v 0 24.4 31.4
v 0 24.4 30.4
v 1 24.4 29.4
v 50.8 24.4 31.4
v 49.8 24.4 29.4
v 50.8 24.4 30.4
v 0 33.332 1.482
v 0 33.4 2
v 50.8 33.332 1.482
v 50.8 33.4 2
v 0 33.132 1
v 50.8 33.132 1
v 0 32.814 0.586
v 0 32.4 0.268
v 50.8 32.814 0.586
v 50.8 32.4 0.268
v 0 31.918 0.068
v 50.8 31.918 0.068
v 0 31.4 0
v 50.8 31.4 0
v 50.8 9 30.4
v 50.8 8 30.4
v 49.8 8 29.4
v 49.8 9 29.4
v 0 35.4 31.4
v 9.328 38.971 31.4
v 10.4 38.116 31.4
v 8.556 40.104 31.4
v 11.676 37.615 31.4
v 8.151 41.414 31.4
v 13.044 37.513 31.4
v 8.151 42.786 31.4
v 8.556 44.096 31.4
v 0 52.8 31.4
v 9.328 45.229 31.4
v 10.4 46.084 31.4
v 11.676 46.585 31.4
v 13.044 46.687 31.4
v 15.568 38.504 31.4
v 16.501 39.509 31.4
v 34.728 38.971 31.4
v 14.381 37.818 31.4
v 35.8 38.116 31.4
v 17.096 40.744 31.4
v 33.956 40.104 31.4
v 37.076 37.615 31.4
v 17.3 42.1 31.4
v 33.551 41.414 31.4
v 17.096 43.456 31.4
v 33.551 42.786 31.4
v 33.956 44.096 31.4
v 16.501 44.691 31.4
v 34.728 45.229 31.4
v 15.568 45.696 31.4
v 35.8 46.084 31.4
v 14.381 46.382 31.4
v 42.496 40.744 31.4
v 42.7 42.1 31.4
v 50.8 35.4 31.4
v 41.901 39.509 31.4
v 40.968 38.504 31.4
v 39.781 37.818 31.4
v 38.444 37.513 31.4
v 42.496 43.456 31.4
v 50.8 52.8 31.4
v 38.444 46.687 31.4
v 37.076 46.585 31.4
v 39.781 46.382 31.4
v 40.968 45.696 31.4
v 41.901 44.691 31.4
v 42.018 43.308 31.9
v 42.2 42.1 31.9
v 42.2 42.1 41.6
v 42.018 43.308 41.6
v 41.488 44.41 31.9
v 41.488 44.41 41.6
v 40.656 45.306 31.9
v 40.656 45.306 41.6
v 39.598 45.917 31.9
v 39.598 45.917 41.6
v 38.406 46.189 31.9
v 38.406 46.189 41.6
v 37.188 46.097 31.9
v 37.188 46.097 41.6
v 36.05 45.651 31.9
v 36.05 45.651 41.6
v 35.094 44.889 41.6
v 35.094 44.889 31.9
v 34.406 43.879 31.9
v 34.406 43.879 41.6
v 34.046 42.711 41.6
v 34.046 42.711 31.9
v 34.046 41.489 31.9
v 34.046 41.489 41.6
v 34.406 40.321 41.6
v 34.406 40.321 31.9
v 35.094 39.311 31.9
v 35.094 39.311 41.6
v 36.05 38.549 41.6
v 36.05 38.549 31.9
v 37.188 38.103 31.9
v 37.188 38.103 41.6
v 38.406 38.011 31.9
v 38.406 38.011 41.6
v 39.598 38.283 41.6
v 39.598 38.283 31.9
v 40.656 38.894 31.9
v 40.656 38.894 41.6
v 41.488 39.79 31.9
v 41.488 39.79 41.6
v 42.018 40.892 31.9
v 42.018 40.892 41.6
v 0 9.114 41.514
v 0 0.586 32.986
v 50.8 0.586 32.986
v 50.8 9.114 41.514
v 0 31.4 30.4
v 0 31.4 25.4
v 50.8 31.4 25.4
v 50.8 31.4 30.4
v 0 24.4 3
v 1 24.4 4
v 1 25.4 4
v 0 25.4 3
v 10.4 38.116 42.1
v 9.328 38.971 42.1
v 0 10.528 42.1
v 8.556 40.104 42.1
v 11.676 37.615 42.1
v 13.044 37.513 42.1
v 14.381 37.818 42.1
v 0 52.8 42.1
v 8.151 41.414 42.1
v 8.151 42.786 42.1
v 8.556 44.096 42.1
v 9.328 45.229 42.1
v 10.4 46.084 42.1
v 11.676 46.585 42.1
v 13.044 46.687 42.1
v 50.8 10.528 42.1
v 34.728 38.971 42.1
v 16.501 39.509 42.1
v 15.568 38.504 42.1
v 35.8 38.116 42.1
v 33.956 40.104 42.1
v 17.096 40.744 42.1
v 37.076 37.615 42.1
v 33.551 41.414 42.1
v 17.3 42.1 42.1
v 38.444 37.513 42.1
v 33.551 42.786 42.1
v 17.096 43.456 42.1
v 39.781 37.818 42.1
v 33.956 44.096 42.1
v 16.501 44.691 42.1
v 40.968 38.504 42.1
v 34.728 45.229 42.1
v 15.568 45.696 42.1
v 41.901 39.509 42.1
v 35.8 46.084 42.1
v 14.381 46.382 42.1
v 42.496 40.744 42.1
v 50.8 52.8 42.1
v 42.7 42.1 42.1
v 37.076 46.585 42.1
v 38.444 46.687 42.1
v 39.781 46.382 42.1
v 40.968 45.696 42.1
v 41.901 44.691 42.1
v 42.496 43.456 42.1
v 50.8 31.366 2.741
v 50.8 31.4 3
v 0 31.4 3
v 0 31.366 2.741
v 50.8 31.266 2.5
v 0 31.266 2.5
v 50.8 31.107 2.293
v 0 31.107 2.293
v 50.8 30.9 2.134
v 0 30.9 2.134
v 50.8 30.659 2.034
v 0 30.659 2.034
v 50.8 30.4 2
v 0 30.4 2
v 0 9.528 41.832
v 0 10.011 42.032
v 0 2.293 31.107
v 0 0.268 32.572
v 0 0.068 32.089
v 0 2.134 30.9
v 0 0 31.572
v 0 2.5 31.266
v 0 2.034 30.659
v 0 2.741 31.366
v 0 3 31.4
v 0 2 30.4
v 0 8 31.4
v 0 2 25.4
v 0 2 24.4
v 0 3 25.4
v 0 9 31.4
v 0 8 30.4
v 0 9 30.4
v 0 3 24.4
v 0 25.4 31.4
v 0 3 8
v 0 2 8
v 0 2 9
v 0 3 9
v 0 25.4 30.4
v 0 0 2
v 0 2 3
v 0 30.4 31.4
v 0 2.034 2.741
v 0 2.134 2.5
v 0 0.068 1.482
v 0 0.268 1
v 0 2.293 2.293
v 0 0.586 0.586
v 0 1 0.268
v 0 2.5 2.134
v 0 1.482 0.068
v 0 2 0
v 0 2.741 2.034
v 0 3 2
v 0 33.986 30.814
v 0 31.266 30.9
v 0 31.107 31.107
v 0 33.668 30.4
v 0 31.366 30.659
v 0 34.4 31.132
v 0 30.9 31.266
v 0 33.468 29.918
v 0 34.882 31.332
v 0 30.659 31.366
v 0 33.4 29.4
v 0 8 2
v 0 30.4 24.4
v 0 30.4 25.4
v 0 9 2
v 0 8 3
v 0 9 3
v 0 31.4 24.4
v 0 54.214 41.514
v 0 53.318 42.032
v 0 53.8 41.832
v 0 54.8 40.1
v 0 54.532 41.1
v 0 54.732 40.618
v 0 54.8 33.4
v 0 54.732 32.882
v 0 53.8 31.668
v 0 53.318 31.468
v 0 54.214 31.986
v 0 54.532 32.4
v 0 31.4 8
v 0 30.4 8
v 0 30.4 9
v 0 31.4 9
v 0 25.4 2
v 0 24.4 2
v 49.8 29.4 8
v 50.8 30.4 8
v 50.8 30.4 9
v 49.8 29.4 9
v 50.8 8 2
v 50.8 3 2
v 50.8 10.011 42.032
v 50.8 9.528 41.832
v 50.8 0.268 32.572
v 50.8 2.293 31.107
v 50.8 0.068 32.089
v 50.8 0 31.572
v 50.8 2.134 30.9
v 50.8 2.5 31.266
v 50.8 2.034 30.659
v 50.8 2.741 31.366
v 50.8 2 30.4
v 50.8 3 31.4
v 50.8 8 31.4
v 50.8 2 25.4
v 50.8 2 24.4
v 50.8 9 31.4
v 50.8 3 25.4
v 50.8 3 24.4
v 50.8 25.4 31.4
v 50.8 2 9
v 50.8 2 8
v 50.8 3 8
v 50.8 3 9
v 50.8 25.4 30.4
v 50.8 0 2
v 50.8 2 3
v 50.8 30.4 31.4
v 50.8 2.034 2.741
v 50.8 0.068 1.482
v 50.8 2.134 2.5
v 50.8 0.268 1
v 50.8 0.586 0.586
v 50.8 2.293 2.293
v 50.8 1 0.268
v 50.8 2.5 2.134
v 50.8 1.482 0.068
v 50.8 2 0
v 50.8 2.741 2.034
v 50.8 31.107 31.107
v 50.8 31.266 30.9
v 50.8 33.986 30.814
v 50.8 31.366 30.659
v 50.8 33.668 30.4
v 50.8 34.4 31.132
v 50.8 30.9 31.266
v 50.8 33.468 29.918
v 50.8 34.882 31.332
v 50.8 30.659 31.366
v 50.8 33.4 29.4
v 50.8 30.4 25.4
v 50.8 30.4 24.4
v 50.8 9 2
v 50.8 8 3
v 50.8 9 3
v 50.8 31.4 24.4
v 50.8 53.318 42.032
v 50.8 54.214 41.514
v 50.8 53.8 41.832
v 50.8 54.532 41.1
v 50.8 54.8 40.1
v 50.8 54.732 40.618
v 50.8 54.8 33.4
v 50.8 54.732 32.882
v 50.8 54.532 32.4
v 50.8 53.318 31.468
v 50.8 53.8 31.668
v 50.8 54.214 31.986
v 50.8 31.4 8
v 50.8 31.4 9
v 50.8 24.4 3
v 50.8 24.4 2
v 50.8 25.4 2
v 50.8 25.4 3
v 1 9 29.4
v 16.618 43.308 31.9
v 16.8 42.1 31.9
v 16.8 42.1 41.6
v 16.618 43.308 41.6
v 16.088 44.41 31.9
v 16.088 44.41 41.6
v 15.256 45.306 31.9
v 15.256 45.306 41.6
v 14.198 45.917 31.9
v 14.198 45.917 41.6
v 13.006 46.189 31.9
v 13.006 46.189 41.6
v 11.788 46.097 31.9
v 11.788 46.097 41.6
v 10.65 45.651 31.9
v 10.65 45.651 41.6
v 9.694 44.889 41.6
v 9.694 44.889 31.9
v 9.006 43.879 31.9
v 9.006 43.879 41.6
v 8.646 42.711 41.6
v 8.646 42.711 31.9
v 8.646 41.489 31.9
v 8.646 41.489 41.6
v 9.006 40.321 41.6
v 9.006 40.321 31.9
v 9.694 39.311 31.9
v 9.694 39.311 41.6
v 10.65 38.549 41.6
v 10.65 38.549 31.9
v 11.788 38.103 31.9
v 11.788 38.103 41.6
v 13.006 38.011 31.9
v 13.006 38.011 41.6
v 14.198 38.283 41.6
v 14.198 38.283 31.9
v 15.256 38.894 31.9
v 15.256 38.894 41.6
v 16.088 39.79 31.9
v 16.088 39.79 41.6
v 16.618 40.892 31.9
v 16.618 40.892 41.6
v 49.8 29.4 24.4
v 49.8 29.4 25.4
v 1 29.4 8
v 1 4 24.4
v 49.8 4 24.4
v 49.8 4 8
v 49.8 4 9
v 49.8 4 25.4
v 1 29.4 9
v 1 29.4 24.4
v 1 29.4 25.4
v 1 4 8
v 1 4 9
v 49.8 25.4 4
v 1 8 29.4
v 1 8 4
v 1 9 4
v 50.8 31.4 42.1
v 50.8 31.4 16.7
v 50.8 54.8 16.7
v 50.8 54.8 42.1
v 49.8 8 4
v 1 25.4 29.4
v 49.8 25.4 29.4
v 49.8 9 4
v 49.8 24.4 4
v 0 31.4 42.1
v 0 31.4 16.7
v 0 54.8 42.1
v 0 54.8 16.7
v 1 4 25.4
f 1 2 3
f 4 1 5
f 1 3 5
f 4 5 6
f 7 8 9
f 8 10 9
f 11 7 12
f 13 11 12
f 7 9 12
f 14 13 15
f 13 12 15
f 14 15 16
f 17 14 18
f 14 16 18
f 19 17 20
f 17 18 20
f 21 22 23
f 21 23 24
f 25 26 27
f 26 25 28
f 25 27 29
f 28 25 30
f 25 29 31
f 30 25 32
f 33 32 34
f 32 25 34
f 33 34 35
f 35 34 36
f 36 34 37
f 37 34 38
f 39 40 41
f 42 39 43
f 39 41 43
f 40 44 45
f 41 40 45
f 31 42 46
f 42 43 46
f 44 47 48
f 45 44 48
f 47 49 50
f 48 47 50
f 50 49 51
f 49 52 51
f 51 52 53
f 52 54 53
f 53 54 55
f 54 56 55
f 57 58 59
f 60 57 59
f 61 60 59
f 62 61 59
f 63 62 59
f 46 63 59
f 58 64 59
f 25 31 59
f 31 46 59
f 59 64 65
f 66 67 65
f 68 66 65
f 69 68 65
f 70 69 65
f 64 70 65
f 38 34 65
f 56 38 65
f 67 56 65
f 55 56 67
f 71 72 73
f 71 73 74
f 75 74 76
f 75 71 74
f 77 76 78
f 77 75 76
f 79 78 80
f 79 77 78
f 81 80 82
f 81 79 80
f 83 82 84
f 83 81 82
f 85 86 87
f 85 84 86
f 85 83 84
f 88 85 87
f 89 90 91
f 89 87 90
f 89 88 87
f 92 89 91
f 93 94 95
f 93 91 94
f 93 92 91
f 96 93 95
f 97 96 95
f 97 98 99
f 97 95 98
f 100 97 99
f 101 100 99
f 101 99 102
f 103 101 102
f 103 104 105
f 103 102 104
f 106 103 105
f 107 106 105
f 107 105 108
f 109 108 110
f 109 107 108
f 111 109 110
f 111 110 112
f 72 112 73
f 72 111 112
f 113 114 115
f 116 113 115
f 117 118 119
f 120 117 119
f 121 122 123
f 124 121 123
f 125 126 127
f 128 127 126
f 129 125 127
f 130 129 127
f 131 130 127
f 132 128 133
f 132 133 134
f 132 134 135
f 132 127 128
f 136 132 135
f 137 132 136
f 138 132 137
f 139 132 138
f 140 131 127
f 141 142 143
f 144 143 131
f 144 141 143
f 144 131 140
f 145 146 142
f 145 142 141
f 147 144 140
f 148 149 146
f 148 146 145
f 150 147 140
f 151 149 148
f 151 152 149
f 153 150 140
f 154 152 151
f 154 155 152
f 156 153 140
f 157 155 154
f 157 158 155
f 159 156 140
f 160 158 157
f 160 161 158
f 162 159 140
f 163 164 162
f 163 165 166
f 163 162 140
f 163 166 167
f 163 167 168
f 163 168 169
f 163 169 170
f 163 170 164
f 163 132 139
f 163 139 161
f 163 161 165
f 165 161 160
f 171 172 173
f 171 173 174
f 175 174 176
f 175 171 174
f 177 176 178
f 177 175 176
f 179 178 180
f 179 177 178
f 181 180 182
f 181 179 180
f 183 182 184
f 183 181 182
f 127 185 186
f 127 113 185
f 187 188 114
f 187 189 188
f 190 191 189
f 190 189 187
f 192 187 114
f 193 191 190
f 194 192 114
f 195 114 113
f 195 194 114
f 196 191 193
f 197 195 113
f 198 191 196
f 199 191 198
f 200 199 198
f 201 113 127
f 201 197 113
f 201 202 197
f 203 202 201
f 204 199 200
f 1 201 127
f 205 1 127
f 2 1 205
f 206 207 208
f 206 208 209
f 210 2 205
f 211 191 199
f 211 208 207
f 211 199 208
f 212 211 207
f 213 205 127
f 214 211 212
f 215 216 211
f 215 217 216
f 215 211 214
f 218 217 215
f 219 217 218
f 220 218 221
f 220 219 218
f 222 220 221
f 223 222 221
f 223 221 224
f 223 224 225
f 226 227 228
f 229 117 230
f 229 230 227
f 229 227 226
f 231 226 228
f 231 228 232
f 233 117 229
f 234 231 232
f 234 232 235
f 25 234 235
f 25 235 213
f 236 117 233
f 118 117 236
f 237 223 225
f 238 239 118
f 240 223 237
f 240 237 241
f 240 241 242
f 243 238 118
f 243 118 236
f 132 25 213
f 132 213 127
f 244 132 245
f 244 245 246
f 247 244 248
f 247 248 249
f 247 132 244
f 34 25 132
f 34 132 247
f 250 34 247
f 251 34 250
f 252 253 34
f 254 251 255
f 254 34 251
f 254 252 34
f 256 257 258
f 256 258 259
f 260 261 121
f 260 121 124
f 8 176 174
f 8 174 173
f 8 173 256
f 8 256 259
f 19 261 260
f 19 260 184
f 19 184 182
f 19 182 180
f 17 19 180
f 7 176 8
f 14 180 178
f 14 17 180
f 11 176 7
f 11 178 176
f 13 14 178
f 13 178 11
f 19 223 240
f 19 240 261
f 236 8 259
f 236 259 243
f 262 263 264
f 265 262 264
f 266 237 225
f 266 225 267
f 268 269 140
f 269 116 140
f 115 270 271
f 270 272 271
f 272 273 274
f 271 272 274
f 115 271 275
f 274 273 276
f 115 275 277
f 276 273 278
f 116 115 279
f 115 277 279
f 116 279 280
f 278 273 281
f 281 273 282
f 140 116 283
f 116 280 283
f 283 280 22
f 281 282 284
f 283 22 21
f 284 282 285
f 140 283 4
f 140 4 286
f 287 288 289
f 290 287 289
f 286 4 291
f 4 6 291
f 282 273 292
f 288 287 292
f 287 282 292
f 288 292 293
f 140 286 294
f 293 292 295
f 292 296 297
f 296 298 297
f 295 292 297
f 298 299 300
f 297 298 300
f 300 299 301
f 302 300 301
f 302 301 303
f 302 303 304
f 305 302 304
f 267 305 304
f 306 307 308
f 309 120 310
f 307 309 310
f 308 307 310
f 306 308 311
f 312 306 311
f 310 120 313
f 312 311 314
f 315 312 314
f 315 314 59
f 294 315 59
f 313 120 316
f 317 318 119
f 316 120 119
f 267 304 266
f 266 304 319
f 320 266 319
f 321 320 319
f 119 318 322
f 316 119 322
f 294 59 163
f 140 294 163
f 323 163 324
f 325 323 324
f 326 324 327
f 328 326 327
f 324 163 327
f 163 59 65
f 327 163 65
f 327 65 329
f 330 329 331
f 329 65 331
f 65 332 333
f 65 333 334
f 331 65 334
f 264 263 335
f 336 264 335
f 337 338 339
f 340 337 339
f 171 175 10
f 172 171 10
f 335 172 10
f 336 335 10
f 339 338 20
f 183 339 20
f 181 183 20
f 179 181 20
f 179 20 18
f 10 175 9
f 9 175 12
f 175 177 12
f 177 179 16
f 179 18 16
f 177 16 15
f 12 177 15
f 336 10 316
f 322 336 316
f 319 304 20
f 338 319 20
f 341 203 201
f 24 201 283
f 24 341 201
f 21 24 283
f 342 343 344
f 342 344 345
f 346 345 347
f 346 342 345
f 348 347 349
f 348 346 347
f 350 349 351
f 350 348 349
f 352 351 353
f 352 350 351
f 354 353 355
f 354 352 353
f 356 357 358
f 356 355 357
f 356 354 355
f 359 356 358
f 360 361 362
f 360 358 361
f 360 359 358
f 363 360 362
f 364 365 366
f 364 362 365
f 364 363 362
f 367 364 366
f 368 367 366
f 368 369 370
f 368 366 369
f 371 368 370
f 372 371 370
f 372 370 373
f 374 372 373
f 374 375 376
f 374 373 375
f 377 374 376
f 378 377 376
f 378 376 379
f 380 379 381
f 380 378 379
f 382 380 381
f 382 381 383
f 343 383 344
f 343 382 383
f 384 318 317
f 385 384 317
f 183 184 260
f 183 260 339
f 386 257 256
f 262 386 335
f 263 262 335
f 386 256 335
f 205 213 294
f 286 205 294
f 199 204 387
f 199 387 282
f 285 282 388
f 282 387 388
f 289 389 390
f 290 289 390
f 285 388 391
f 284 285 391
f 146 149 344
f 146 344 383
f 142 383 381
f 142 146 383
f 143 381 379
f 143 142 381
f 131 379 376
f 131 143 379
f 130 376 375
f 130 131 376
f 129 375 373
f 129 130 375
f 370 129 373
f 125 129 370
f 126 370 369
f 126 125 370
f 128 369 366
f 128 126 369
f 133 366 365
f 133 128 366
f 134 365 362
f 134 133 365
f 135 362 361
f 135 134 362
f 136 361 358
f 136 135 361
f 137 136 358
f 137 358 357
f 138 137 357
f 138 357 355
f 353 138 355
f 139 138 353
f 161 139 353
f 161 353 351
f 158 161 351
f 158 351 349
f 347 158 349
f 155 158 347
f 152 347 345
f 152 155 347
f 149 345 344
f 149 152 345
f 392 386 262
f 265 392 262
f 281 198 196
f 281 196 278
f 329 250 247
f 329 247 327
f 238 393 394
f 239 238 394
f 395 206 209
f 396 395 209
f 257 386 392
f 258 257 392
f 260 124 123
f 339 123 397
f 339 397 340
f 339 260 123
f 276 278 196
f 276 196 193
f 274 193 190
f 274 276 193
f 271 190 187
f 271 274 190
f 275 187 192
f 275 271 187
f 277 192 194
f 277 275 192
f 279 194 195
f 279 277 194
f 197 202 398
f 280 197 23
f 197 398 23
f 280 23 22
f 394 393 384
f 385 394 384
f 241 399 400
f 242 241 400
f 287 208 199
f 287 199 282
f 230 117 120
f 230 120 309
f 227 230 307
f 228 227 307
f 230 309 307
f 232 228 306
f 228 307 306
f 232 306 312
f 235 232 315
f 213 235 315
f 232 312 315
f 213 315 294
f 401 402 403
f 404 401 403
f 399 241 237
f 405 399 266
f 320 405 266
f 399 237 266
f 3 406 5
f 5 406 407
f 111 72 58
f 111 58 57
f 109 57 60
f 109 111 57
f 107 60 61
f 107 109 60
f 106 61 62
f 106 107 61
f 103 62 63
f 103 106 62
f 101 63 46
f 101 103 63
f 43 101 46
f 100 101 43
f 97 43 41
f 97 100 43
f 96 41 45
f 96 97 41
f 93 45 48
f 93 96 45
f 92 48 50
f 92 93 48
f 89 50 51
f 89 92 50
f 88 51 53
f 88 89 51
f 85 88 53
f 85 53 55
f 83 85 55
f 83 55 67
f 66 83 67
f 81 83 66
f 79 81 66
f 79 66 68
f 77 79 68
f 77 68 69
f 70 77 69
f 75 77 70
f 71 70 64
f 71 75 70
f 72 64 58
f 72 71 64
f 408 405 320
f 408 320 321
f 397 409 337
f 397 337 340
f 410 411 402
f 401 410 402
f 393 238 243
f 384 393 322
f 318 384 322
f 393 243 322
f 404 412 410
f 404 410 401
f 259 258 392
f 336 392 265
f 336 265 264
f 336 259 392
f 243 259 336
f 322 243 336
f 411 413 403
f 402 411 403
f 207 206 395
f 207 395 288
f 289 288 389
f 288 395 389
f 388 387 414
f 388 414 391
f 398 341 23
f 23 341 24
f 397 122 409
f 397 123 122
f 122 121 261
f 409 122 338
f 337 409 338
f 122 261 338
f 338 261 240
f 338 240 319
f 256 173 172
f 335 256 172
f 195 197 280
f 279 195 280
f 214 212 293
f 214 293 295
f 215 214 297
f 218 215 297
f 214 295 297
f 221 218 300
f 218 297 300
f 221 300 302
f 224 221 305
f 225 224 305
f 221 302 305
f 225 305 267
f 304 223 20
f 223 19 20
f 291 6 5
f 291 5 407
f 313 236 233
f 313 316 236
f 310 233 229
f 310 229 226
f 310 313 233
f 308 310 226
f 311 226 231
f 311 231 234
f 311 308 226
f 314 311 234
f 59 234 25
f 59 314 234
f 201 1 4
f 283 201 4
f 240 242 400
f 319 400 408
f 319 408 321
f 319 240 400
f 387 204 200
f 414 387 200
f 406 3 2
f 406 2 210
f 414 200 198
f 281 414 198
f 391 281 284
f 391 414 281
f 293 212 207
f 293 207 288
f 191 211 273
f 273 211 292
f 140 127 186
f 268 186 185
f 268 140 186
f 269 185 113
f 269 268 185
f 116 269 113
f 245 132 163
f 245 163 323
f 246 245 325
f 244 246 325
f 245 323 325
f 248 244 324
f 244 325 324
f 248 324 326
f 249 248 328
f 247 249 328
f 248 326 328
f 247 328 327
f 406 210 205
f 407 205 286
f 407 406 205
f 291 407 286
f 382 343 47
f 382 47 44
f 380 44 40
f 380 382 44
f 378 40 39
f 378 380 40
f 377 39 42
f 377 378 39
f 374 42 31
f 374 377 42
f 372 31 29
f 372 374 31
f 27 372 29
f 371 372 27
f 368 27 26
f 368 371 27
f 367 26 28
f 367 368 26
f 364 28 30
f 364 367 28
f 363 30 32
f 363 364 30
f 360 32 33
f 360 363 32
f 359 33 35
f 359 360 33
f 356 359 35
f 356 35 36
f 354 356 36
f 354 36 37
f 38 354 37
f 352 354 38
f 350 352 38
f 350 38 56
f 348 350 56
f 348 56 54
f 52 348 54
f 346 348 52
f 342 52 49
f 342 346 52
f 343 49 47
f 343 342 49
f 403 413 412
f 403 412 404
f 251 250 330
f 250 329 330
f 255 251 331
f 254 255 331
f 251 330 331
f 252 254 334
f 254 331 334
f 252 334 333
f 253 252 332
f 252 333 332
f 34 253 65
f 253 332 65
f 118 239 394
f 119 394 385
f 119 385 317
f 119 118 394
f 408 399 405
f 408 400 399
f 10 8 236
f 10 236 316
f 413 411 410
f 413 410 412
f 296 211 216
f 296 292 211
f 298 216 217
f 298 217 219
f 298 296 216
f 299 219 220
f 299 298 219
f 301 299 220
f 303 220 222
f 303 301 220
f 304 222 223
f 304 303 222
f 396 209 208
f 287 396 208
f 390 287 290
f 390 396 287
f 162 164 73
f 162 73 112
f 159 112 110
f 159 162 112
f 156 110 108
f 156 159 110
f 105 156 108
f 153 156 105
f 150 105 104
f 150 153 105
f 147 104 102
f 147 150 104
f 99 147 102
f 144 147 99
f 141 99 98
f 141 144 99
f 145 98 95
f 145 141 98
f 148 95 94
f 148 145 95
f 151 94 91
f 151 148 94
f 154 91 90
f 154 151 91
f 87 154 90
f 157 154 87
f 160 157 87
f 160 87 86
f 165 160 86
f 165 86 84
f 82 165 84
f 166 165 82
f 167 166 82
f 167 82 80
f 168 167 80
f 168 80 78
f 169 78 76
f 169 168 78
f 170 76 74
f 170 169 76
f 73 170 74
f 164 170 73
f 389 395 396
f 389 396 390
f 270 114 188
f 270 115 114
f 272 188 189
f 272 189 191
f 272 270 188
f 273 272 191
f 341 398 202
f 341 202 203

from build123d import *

# Parameters (mm, degrees)
BOX011_W          = 50.8
BOX011_H          = 23.4
BOX011_DEPTH      = 25.4
BOX005_W          = 50.8
BOX005_H          = 4
BOX005_DEPTH      = 1
BOX008_W          = 50.8
BOX008_H          = 1
BOX008_DEPTH      = 4
BOX009_W          = 50.8
BOX009_H          = 1
BOX009_DEPTH      = 4
BOX003_W          = 50.8
BOX003_H          = 4
BOX003_DEPTH      = 1
BOX002_W          = 50.8
BOX002_H          = 4
BOX002_DEPTH      = 1
BOX006_W          = 50.8
BOX006_H          = 1
BOX006_DEPTH      = 4
BOX007_W          = 50.8
BOX007_H          = 1
BOX007_DEPTH      = 4
BOX004_W          = 50.8
BOX004_H          = 4
BOX004_DEPTH      = 1
CYLINDER001_R     = 4.1
CYLINDER001_DEPTH = 14
CYLINDER_R        = 4.1
CYLINDER_DEPTH    = 14
BOX010_W          = 50.8
BOX010_H          = 54.8
BOX010_DEPTH      = 10.7
BOX_W             = 52
BOX_H             = 29.4
BOX_DEPTH         = 29.4
FILLET001_R       = 1
BOX001_W          = 50.8
BOX001_H          = 33.4
BOX001_DEPTH      = 33.4
FILLET_R          = 2
FILLET002_R       = 2
CHAMFER_SIZE      = 9.7
FILLET003_R       = 2
FILLET004_R       = 2
FILLET005_R       = 2
CHAMFER001_SIZE   = 0.5
CHAMFER002_SIZE   = 1


with BuildPart() as cube011:
    # Box011 → Box011 (new body)
    with BuildSketch(Plane(origin=(0, 31.4, 16.7), x_dir=(1, 0, 0), z_dir=(0, 0, 1))):
        with Locations((25.4, 11.7)):
            Rectangle(BOX011_W, BOX011_H)
    extrude(amount=BOX011_DEPTH)


with BuildPart() as cube005:
    # Box005 → Box005 (new body)
    with BuildSketch(Plane(origin=(0, 29.4, 24.4), x_dir=(1, 0, 0), z_dir=(0, 0, 1))):
        with Locations((25.4, 2)):
            Rectangle(BOX005_W, BOX005_H)
    extrude(amount=BOX005_DEPTH)


with BuildPart() as cube008:
    # Box008 → Box008 (new body)
    with BuildSketch(Plane(origin=(0, 24.4, 29.4), x_dir=(1, 0, 0), z_dir=(0, 0, 1))):
        with Locations((25.4, 0.5)):
            Rectangle(BOX008_W, BOX008_H)
    extrude(amount=BOX008_DEPTH)


with BuildPart() as cube009:
    # Box009 → Box009 (new body)
    with BuildSketch(Plane(origin=(0, 8, 29.4), x_dir=(1, 0, 0), z_dir=(0, 0, 1))):
        with Locations((25.4, 0.5)):
            Rectangle(BOX009_W, BOX009_H)
    extrude(amount=BOX009_DEPTH)


with BuildPart() as cube003:
    # Box003 → Box003 (new body)
    with BuildSketch(Plane.XY.offset(24.4)):
        with Locations((25.4, 2)):
            Rectangle(BOX003_W, BOX003_H)
    extrude(amount=BOX003_DEPTH)


with BuildPart() as cube002:
    # Box002 → Box002 (new body)
    with BuildSketch(Plane.XY.offset(8)):
        with Locations((25.4, 2)):
            Rectangle(BOX002_W, BOX002_H)
    extrude(amount=BOX002_DEPTH)


with BuildPart() as cube006:
    # Box006 → Box006 (new body)
    with BuildSketch(Plane(origin=(0, 8, 0), x_dir=(1, 0, 0), z_dir=(0, 0, 1))):
        with Locations((25.4, 0.5)):
            Rectangle(BOX006_W, BOX006_H)
    extrude(amount=BOX006_DEPTH)


with BuildPart() as cube007:
    # Box007 → Box007 (new body)
    with BuildSketch(Plane(origin=(0, 24.4, 0), x_dir=(1, 0, 0), z_dir=(0, 0, 1))):
        with Locations((25.4, 0.5)):
            Rectangle(BOX007_W, BOX007_H)
    extrude(amount=BOX007_DEPTH)


with BuildPart() as cube004:
    # Box004 → Box004 (new body)
    with BuildSketch(Plane(origin=(0, 29.4, 8), x_dir=(1, 0, 0), z_dir=(0, 0, 1))):
        with Locations((25.4, 2)):
            Rectangle(BOX004_W, BOX004_H)
    extrude(amount=BOX004_DEPTH)


with BuildPart() as cylinder001:
    # Cylinder001 → Cylinder001 (new body)
    with BuildSketch(Plane(origin=(38.1, 42.1, 30), x_dir=(1, 0, 0), z_dir=(0, 0, 1))):
        Circle(CYLINDER001_R)
    extrude(amount=CYLINDER001_DEPTH)


with BuildPart() as cylinder:
    # Cylinder → Cylinder (new body)
    with BuildSketch(Plane(origin=(12.7, 42.1, 30), x_dir=(1, 0, 0), z_dir=(0, 0, 1))):
        Circle(CYLINDER_R)
    extrude(amount=CYLINDER_DEPTH)


with BuildPart() as cube010:
    # Box010 → Box010 (new body)
    with BuildSketch(Plane.XY.offset(31.4)):
        with Locations((25.4, 27.4)):
            Rectangle(BOX010_W, BOX010_H)
    extrude(amount=BOX010_DEPTH)


with BuildPart() as fillet001:
    # Box → Box (new body)
    with BuildSketch(Plane(origin=(-1, 2, 2), x_dir=(1, 0, 0), z_dir=(0, 0, 1))):
        with Locations((26, 14.7)):
            Rectangle(BOX_W, BOX_H)
    extrude(amount=BOX_DEPTH)

    # Fillet001
    fillet001_edges = [fillet001.edges().sort_by_distance(p)[0] for p in [
        (25, 2, 31.4),
        (25, 2, 2),
        (25, 31.4, 31.4),
        (25, 31.4, 2),
    ]]
    fillet(fillet001_edges, radius=FILLET001_R)


with BuildPart() as chamfer002:
    # Box001 → Box001 (new body)
    with BuildSketch(Plane.XY):
        with Locations((25.4, 16.7)):
            Rectangle(BOX001_W, BOX001_H)
    extrude(amount=BOX001_DEPTH)

    # Fillet
    fillet_edges = [chamfer002.edges().sort_by_distance(p)[0] for p in [
        (25.4, 33.4, 0),
        (25.4, 0, 0),
        (25.4, 0, 33.4),
        (25.4, 33.4, 33.4),
    ]]
    fillet(fillet_edges, radius=FILLET_R)

    # Cut: cut Fillet001
    add(fillet001.part, mode=Mode.SUBTRACT)

    # Fusion: union Cube010
    add(cube010.part)

    # Fillet002
    fillet002_edges = [chamfer002.edges().sort_by_distance(p)[0] for p in [
        (25.4, 33.4, 31.4),
    ]]
    fillet(fillet002_edges, radius=FILLET002_R)

    # Chamfer
    chamfer_edges = [chamfer002.edges().sort_by_distance(p)[0] for p in [
        (25.4, 0, 42.1),
    ]]
    chamfer(chamfer_edges, length=CHAMFER_SIZE)

    # Fillet003
    fillet003_edges = [chamfer002.edges().sort_by_distance(p)[0] for p in [
        (25.4, 9.7, 42.1),
    ]]
    fillet(fillet003_edges, radius=FILLET003_R)

    # Fillet004
    fillet004_edges = [chamfer002.edges().sort_by_distance(p)[0] for p in [
        (25.4, 0, 32.4),
    ]]
    fillet(fillet004_edges, radius=FILLET004_R)

    # Fillet005
    fillet005_edges = [chamfer002.edges().sort_by_distance(p)[0] for p in [
        (25.4, 54.8, 42.1),
        (25.4, 54.8, 31.4),
    ]]
    fillet(fillet005_edges, radius=FILLET005_R)

    # Cut001: cut Cylinder
    add(cylinder.part, mode=Mode.SUBTRACT)

    # Cut002: cut Cylinder001
    add(cylinder001.part, mode=Mode.SUBTRACT)

    # Fusion001: union Cube005, Cube008, Cube009, Cube003, Cube002, Cube006, Cube007, Cube004
    add(cube005.part)
    add(cube008.part)
    add(cube009.part)
    add(cube003.part)
    add(cube002.part)
    add(cube006.part)
    add(cube007.part)
    add(cube004.part)

    # Chamfer001
    chamfer001_edges = [chamfer002.edges().sort_by_distance(p)[0] for p in [
        (34, 42.1, 42.1),
        (8.6, 42.1, 42.1),
        (34, 42.1, 31.4),
        (8.6, 42.1, 31.4),
    ]]
    chamfer(chamfer001_edges, length=CHAMFER001_SIZE)

    # Chamfer002
    chamfer002_edges = [chamfer002.edges().sort_by_distance(p)[0] for p in [
        (0, 8.5, 29.4),
        (0, 24.9, 29.4),
        (50.8, 8.5, 29.4),
        (50.8, 24.9, 29.4),
        (0, 29.4, 24.9),
        (50.8, 29.4, 24.9),
        (0, 4, 24.9),
        (50.8, 4, 24.9),
        (0, 29.4, 8.5),
        (50.8, 29.4, 8.5),
        (0, 4, 8.5),
        (50.8, 4, 8.5),
        (0, 24.9, 4),
        (50.8, 24.9, 4),
        (0, 8.5, 4),
        (50.8, 8.5, 4),
    ]]
    chamfer(chamfer002_edges, length=CHAMFER002_SIZE)


solid = Compound([cube011.part, chamfer002.part])
